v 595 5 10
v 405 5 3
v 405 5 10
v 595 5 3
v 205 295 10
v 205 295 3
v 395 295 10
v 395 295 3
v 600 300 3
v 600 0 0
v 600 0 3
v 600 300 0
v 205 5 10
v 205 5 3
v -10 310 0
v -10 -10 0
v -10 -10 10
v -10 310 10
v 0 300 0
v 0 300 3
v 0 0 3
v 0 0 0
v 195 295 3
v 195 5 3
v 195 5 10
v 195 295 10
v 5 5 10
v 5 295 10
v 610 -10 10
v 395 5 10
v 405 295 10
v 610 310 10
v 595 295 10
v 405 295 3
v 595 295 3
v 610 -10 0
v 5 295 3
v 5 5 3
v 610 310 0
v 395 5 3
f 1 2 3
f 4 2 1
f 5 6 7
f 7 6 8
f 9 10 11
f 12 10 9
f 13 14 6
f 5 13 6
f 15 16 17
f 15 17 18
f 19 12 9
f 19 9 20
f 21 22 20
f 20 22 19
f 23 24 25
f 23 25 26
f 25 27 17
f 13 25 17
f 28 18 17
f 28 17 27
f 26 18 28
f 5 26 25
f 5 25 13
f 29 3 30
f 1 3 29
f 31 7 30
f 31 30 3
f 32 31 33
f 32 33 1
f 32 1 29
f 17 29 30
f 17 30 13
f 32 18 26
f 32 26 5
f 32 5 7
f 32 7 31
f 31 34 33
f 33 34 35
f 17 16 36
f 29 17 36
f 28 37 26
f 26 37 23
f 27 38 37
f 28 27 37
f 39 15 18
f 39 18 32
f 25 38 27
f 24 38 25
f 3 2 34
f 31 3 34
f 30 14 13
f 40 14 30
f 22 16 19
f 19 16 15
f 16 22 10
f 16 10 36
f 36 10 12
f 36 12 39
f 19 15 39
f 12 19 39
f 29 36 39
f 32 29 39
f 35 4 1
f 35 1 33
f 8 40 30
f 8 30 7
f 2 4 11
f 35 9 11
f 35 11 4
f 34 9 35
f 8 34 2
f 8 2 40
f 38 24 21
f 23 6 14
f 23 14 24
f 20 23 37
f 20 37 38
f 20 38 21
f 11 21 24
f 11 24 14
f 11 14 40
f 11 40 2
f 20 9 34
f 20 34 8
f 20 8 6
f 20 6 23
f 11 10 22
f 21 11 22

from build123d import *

# Parameters (mm, degrees)
CROQUIS1_W              = 620
CROQUIS1_H              = 320
CROQUIS1_W_2            = 190
CROQUIS1_H_2            = 290
SALIENTE_EXTRUIR1_DEPTH = 10
CROQUIS2_W              = 600
CROQUIS2_H              = 300
CORTAR_EXTRUIR1_DEPTH   = 3


with BuildPart() as part:
    # Croquis1 → Saliente-Extruir1 (new body)
    with BuildSketch(Plane.XY):
        with Locations((300, 150)):
            Rectangle(CROQUIS1_W, CROQUIS1_H)
        with Locations((100, 150)):
            Rectangle(CROQUIS1_W_2, CROQUIS1_H_2, mode=Mode.SUBTRACT)
        with Locations((500, 150)):
            Rectangle(CROQUIS1_W_2, CROQUIS1_H_2, mode=Mode.SUBTRACT)
        with Locations((300, 150)):
            Rectangle(CROQUIS1_W_2, CROQUIS1_H_2, mode=Mode.SUBTRACT)
    extrude(amount=SALIENTE_EXTRUIR1_DEPTH)

    # Croquis2 → Cortar-Extruir1 (cut)
    with BuildSketch(Plane(origin=(0, 0, 0), x_dir=(-1, 0, 0), z_dir=(0, 0, -1))):
        with Locations((-300, 150)):
            Rectangle(CROQUIS2_W, CROQUIS2_H)
    extrude(amount=-CORTAR_EXTRUIR1_DEPTH, mode=Mode.SUBTRACT)


solid = part.part
